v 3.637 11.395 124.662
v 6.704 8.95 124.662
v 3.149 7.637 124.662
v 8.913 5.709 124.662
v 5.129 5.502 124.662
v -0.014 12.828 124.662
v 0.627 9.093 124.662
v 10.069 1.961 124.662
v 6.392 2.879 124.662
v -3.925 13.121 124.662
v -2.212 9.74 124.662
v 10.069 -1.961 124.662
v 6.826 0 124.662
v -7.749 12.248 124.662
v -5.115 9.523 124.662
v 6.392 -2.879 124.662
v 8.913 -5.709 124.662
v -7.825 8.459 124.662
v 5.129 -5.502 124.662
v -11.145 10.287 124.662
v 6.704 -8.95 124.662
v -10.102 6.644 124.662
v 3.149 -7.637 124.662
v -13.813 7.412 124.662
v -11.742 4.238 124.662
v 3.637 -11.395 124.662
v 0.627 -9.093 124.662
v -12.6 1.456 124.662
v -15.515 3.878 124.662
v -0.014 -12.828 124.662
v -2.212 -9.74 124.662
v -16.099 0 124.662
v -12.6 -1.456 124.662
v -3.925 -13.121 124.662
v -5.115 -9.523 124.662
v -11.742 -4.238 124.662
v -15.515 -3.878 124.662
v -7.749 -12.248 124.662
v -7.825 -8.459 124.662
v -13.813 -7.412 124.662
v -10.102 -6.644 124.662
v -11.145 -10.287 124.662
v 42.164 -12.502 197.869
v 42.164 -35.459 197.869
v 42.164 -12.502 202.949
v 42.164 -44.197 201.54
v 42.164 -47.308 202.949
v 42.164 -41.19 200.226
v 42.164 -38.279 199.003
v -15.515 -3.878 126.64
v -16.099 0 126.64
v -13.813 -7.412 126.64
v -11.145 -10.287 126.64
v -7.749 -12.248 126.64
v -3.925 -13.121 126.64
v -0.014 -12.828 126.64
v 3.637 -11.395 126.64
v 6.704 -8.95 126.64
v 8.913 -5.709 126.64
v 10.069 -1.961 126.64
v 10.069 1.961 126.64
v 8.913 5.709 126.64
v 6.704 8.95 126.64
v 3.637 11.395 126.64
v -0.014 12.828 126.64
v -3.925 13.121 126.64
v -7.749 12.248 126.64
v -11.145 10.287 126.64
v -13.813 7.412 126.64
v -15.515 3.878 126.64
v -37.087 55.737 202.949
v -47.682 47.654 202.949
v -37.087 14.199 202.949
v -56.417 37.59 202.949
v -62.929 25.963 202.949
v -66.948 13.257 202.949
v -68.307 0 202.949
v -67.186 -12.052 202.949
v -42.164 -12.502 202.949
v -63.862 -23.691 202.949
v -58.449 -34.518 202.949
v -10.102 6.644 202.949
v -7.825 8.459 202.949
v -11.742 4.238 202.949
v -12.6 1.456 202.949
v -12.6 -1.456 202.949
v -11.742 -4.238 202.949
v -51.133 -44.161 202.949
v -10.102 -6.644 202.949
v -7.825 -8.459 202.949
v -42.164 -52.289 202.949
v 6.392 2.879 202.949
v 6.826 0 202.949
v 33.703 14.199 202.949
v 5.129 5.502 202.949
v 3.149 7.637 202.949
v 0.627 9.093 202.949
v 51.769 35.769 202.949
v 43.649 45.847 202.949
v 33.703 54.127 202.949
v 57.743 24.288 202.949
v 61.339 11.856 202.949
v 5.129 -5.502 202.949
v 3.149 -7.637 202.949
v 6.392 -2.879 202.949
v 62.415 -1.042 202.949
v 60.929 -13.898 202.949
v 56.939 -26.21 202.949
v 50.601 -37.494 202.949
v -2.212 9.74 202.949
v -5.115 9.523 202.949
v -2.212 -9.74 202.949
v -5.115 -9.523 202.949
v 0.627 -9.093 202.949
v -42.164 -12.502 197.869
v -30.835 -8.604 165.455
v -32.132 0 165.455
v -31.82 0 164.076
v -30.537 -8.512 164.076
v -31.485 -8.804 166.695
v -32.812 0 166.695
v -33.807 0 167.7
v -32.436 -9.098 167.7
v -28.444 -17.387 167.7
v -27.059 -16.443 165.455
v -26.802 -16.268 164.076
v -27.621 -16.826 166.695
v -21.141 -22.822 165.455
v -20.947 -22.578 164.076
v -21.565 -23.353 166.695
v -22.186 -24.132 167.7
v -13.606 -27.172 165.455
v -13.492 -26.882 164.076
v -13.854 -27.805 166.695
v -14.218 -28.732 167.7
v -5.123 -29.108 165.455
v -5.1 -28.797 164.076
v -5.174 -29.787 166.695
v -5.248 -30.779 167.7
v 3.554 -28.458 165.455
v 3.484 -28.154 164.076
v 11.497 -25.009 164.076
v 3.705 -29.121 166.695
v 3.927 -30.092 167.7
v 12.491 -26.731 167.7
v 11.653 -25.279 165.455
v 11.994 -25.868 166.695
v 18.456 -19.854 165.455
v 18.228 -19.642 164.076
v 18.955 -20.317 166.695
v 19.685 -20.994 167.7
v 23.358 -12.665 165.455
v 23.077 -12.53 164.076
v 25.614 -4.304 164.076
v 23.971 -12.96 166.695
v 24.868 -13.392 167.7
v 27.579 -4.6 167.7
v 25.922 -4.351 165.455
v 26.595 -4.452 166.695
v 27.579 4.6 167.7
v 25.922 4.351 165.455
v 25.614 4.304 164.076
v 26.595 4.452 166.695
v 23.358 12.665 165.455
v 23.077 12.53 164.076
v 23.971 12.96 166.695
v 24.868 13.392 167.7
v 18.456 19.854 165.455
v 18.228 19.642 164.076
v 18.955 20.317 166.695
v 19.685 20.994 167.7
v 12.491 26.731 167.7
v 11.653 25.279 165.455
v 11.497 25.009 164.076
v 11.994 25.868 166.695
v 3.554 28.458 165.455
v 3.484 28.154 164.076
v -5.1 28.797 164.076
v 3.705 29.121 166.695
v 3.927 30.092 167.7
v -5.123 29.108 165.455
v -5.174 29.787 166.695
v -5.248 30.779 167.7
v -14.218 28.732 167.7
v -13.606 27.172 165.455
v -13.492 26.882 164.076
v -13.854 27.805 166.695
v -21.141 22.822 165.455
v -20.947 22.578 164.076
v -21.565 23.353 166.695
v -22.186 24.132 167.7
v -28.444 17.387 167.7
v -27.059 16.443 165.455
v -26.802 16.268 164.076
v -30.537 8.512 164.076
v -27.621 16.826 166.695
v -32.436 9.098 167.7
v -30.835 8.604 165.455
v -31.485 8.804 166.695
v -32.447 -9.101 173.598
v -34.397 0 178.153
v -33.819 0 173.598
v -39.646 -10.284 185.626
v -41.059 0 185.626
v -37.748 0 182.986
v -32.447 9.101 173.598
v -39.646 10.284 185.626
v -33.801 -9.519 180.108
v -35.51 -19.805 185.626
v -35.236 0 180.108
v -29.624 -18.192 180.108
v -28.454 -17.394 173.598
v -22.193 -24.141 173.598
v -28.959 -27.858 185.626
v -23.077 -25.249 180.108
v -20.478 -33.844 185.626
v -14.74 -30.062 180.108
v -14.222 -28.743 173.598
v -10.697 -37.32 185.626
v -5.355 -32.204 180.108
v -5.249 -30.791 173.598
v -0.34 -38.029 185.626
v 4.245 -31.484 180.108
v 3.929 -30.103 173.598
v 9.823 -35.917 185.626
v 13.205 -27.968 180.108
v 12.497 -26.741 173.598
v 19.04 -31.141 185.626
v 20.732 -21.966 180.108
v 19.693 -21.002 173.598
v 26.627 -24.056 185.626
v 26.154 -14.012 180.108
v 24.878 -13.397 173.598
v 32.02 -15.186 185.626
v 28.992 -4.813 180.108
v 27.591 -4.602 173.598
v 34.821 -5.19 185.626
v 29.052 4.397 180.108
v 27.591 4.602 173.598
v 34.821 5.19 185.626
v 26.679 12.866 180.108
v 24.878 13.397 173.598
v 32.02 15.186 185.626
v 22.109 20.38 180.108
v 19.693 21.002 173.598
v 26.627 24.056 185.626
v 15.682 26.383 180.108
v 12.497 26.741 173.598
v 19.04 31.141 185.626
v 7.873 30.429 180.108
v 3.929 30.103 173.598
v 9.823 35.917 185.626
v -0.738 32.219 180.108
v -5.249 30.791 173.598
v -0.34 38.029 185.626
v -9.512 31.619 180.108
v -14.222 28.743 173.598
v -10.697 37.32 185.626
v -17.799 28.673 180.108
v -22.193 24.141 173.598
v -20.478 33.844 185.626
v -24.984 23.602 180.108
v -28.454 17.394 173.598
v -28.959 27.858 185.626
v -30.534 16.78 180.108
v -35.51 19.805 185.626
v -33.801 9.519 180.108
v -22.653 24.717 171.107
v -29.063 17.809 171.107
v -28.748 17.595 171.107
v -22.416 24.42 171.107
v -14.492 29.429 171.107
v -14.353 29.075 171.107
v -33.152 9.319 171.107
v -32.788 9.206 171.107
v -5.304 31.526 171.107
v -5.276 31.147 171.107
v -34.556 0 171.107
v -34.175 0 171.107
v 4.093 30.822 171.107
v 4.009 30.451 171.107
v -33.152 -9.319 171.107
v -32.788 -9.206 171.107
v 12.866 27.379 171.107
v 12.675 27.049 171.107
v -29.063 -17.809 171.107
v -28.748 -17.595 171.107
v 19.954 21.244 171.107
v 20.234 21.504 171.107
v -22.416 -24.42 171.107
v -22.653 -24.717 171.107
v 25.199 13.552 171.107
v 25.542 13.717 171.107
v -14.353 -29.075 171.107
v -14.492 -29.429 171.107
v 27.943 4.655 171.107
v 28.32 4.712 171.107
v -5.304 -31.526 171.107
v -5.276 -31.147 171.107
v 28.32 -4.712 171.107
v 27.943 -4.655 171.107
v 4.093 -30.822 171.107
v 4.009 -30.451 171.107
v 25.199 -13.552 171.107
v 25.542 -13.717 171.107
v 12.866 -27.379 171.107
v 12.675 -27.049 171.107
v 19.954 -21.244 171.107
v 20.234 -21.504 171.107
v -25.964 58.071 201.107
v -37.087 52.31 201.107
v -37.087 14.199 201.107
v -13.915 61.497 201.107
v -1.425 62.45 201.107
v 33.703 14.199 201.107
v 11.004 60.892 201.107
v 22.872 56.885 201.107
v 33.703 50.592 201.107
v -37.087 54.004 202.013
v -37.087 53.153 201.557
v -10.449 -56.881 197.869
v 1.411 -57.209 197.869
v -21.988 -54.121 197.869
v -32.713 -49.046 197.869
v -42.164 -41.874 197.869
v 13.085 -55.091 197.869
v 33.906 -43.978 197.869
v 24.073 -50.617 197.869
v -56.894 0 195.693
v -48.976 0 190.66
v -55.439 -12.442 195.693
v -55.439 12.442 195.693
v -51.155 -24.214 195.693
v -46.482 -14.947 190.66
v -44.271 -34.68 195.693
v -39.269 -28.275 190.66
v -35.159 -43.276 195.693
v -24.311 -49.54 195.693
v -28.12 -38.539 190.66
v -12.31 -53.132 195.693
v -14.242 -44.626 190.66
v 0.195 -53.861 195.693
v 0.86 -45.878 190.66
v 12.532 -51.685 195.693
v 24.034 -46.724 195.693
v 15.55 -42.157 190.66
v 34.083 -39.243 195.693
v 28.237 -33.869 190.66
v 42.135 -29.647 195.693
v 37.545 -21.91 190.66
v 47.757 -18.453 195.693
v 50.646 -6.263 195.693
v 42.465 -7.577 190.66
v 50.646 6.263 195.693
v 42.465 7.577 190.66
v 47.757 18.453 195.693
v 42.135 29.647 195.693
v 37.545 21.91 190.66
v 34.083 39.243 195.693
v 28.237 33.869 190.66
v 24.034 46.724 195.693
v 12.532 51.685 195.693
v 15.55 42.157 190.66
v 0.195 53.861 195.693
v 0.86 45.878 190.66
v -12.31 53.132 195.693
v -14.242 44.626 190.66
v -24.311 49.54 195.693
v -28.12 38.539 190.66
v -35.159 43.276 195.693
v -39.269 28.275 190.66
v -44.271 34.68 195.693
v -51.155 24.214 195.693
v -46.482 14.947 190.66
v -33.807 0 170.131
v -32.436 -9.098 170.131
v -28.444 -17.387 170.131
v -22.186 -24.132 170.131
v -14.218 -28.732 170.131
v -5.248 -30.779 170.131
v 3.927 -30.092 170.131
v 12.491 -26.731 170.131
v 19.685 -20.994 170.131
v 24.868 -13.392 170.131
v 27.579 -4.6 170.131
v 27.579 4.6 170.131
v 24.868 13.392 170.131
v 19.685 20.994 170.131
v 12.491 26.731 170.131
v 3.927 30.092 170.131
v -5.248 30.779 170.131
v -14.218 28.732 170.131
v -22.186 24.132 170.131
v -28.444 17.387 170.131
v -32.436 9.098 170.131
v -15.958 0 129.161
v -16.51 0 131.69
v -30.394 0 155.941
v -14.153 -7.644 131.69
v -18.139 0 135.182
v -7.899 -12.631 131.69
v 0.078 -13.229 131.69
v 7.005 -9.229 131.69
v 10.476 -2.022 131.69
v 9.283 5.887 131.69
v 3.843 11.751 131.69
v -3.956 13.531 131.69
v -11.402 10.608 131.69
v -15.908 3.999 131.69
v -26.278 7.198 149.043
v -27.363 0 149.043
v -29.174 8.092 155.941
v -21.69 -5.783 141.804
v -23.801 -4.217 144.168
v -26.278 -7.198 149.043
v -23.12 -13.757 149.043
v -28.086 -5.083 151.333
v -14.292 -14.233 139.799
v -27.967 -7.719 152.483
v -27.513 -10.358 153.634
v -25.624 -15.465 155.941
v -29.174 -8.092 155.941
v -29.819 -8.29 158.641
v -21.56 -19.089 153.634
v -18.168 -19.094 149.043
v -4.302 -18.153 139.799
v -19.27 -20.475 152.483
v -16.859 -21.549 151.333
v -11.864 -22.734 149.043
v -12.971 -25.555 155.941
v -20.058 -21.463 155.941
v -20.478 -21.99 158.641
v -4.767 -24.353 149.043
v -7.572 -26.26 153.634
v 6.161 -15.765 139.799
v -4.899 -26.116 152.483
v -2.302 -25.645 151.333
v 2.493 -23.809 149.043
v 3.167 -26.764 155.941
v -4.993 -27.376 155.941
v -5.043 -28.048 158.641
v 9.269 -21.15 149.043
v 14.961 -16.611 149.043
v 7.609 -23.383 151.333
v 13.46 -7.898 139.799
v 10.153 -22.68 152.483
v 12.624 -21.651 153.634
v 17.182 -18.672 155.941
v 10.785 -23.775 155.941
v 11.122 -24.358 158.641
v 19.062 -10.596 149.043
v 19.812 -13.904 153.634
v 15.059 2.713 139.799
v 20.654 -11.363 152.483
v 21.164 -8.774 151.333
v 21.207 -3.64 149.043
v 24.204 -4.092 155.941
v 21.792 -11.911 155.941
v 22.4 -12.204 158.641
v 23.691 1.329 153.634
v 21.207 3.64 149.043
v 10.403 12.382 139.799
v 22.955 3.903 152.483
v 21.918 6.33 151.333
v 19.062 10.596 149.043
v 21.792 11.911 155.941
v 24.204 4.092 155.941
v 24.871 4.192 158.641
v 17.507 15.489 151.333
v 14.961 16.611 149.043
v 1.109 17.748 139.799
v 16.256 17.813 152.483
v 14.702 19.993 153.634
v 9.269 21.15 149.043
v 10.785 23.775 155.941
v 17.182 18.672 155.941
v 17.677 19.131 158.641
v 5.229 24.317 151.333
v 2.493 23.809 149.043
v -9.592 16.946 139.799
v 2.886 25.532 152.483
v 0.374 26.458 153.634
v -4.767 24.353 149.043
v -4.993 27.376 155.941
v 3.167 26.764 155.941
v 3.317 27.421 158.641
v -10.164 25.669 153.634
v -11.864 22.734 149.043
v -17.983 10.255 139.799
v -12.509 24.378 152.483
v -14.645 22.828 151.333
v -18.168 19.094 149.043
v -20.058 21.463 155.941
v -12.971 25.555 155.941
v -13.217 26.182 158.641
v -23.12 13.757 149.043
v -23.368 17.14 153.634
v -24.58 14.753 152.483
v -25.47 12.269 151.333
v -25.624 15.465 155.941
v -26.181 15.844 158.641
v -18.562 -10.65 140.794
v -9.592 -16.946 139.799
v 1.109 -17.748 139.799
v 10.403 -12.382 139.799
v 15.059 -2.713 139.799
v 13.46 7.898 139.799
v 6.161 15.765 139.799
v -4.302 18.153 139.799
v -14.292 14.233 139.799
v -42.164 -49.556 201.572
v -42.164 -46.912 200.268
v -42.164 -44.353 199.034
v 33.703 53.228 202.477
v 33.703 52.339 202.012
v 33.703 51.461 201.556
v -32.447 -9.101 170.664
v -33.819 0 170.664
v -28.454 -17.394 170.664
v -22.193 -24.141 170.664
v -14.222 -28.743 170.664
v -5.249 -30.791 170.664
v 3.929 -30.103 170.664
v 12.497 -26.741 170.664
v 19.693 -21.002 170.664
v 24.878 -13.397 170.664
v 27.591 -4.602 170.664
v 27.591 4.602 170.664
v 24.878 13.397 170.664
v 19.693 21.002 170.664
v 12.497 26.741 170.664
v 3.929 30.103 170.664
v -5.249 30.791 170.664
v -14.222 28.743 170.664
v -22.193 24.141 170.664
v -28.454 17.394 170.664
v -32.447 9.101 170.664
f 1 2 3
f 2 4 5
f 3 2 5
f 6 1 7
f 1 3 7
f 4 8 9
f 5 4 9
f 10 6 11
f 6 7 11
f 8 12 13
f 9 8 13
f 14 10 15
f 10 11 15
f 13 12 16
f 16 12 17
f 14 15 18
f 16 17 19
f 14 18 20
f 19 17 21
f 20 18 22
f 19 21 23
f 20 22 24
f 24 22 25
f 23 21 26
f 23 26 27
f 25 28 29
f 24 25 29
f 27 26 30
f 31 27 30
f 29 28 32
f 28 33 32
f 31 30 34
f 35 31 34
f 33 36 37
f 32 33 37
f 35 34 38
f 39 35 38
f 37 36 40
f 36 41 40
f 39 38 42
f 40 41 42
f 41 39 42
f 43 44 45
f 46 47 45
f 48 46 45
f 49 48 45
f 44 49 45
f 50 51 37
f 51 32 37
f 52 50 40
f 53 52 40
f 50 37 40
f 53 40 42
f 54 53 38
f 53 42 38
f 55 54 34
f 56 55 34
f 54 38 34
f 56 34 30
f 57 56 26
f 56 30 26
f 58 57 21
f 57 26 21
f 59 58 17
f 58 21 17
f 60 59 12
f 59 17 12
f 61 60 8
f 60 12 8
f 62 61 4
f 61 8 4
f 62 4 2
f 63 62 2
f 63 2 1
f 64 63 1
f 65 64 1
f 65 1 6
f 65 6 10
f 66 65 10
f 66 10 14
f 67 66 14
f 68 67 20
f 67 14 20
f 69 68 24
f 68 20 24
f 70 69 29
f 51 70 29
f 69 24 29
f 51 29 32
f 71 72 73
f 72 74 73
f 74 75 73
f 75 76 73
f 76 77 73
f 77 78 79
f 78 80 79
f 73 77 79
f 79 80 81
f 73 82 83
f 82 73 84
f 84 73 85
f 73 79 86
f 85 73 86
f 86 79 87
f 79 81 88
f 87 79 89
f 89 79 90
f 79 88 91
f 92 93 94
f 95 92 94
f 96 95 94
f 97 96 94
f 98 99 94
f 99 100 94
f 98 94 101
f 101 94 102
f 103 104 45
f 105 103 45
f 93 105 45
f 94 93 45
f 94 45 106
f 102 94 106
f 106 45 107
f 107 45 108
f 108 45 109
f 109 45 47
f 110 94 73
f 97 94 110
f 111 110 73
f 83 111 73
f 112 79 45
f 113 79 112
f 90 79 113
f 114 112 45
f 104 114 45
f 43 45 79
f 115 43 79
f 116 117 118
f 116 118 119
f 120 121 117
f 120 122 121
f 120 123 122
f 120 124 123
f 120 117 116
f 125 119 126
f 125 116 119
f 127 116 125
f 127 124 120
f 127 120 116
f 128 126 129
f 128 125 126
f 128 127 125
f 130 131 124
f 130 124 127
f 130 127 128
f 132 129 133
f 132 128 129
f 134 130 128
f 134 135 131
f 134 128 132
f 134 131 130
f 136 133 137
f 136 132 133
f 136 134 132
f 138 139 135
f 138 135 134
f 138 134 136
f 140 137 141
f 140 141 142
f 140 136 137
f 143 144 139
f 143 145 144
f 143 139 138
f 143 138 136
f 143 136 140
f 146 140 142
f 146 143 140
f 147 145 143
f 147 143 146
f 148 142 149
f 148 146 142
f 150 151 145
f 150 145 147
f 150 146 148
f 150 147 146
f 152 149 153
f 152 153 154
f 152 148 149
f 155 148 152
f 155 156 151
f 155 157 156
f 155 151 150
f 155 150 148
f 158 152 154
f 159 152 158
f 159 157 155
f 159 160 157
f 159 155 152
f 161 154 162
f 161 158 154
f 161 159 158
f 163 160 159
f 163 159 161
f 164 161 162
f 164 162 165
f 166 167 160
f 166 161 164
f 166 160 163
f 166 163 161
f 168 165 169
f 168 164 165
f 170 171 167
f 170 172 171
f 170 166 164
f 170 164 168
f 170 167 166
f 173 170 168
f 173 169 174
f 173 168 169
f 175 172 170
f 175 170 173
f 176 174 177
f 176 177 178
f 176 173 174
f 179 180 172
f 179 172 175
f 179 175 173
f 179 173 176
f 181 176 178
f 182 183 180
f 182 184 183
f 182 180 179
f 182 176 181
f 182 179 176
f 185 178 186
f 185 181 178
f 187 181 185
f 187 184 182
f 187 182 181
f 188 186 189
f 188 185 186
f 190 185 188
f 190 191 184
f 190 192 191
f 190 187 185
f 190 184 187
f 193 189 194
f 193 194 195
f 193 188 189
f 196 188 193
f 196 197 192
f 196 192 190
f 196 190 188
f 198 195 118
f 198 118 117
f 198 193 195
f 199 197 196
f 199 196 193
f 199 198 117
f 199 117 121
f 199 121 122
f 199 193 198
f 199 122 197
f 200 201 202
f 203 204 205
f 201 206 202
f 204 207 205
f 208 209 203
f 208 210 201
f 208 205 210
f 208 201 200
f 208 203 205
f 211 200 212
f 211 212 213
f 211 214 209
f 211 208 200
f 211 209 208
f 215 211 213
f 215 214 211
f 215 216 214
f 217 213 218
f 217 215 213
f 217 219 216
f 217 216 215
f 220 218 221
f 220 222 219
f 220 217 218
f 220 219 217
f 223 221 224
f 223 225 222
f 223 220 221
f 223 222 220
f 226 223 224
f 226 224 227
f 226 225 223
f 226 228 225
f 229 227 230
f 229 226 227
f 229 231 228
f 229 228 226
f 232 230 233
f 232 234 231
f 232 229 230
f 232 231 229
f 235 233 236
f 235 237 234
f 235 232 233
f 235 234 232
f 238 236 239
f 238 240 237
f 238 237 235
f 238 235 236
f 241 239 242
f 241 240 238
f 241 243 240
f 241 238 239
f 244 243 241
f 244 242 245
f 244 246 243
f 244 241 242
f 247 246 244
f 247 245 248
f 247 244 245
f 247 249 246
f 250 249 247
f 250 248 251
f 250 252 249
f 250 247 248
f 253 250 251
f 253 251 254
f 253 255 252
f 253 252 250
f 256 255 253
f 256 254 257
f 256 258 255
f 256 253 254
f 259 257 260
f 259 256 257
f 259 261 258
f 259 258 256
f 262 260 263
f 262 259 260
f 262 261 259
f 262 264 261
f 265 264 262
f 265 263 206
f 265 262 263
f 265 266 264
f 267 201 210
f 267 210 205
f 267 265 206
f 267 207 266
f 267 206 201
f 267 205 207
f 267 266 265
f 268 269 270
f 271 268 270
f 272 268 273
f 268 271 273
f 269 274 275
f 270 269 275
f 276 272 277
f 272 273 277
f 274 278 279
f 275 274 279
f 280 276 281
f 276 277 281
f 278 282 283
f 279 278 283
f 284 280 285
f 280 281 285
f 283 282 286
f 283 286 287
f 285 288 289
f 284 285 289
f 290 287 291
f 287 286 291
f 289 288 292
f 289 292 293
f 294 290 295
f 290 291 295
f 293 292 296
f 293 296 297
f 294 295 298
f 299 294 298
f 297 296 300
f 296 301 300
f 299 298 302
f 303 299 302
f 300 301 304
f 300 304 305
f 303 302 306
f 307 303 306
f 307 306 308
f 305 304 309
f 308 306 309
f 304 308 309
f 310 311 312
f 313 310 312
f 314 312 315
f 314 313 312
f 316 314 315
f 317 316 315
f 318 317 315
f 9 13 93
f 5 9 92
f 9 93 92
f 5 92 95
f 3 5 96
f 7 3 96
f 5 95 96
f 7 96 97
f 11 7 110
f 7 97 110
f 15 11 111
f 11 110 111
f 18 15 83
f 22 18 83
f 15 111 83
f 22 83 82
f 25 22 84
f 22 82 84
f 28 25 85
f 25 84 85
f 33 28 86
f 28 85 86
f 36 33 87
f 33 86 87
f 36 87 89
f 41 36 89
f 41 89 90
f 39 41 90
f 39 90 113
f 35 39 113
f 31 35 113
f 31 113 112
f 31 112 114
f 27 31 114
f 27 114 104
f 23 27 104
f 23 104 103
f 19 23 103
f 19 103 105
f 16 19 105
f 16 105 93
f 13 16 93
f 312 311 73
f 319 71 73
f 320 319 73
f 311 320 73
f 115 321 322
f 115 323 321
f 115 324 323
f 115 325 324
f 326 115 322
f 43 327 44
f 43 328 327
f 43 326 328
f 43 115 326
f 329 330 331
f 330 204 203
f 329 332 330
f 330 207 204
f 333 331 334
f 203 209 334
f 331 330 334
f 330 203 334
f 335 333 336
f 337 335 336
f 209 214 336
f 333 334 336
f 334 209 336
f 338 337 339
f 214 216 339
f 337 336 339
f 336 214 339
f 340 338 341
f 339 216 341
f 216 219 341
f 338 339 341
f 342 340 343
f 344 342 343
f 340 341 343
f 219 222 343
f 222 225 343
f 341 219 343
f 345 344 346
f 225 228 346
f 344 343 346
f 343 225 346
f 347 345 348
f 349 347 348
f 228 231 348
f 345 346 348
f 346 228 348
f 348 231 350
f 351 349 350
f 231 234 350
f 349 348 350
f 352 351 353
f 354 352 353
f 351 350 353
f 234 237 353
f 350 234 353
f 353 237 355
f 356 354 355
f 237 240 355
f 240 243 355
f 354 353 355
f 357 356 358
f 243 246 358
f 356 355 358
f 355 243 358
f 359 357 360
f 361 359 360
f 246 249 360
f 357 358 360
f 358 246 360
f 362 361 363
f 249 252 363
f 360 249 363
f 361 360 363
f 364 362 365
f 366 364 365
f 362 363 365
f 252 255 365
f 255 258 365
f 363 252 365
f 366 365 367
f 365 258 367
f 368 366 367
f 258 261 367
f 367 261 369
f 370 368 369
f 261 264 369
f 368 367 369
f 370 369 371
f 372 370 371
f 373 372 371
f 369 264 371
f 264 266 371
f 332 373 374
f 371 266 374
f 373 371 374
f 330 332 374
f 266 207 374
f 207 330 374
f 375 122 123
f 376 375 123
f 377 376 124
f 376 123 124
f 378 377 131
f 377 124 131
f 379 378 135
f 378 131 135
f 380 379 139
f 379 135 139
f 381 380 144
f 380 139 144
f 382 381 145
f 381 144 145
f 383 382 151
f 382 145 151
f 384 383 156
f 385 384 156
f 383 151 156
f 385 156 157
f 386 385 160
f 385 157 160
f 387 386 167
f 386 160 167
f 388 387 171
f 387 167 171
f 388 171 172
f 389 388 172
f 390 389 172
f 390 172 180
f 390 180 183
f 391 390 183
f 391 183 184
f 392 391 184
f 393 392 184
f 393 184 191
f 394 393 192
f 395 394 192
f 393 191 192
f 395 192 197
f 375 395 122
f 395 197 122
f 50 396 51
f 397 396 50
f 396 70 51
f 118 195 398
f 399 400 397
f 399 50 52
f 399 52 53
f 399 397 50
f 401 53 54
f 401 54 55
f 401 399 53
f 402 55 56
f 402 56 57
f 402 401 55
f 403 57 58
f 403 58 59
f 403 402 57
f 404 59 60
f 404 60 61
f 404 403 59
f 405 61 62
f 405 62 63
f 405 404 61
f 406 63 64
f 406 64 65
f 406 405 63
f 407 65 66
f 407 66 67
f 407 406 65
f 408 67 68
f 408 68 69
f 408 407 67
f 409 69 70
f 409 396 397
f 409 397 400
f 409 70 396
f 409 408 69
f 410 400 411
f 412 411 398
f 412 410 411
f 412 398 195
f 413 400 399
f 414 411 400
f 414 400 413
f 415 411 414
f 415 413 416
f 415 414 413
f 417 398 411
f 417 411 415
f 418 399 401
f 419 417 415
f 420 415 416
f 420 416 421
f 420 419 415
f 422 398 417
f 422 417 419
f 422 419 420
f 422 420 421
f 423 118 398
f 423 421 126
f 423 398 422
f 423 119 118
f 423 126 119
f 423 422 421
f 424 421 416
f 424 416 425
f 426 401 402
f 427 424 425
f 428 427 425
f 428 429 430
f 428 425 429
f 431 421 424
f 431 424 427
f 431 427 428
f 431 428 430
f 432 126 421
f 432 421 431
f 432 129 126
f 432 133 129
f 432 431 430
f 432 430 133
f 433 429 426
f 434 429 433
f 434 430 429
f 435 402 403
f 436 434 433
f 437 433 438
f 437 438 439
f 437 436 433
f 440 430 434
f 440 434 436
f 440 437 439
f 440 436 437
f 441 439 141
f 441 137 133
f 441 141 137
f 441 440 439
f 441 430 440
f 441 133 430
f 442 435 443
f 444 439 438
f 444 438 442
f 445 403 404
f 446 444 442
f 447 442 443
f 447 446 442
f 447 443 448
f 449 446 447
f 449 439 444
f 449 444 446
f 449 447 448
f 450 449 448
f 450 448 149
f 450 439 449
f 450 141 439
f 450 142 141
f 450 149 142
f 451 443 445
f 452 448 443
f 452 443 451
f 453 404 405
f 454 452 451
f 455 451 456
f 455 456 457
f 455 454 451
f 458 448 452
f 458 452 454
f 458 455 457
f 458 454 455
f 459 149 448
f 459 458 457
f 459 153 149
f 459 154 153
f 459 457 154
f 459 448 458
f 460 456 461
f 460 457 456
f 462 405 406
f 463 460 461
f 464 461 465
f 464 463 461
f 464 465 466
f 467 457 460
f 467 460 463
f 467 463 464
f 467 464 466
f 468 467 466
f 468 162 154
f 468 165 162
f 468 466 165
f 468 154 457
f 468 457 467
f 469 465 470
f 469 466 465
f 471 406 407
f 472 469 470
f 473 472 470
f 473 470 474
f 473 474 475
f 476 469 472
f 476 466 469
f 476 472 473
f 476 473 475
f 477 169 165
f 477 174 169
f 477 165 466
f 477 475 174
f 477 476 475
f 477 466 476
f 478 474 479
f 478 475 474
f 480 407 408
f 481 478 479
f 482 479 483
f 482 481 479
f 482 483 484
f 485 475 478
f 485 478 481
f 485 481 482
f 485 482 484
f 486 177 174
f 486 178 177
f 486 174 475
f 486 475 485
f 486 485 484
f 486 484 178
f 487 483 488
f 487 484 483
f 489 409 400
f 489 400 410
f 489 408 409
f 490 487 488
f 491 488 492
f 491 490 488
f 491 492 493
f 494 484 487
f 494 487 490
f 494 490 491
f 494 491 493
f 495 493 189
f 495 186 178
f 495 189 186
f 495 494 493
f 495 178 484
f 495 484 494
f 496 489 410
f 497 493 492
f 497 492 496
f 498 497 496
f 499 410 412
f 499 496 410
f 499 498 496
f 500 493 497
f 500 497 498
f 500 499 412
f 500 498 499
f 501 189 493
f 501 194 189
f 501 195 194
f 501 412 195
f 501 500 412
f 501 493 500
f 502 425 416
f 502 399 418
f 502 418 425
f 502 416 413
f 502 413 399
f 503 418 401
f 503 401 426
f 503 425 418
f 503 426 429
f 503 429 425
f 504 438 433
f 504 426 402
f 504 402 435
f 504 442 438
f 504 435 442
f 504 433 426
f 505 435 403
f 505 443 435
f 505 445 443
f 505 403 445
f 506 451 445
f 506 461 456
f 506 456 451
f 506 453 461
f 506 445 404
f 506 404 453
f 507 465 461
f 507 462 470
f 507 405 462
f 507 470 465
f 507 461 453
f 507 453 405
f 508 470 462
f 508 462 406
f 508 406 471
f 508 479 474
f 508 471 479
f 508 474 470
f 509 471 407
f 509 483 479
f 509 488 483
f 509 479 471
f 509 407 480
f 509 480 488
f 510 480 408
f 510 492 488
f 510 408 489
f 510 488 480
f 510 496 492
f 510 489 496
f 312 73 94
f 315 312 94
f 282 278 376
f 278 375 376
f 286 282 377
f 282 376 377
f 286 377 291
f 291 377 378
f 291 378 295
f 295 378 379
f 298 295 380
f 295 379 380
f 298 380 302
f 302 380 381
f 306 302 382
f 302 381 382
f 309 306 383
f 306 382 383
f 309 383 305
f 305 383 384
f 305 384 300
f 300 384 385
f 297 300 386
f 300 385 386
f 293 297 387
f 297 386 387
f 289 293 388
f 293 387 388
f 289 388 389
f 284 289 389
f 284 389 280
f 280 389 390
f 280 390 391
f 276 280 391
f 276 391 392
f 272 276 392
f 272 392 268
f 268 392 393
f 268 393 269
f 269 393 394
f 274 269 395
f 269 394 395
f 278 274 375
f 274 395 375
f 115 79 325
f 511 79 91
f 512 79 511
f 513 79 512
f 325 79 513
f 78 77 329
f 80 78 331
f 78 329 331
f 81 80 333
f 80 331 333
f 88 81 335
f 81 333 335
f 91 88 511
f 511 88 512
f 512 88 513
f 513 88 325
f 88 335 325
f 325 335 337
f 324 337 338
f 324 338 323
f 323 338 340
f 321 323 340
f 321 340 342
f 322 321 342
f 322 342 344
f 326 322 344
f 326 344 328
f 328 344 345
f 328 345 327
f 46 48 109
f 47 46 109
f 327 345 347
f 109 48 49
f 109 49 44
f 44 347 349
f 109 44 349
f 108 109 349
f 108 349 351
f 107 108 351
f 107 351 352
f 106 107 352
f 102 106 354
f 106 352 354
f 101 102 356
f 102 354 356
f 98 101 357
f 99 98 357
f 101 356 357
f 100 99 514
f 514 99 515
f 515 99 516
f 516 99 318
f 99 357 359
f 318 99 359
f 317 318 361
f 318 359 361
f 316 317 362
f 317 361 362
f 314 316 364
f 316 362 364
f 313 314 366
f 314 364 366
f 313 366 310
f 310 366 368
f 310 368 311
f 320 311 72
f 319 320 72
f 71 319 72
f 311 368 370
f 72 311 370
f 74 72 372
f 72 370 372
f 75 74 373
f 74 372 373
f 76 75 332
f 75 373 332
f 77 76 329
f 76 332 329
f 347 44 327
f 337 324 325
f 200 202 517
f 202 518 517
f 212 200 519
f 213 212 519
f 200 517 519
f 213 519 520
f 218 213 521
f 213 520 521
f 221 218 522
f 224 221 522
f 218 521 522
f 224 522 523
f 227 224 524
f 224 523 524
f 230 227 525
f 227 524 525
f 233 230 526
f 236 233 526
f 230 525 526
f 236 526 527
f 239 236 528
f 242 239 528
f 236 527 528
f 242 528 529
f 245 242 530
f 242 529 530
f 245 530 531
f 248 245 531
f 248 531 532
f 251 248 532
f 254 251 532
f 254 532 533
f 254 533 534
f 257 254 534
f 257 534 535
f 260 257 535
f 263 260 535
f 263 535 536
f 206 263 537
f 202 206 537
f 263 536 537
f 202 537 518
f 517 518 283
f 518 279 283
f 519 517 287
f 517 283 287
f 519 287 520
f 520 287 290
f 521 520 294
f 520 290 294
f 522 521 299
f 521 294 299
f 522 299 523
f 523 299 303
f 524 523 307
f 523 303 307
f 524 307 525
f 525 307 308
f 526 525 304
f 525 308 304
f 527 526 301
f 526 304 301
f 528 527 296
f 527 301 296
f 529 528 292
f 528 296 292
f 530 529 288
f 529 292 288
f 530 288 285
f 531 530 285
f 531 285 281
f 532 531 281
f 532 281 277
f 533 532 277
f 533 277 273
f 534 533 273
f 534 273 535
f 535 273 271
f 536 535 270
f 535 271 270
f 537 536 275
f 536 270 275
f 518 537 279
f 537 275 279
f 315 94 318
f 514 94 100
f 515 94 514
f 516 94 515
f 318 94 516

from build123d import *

# Parameters (mm, degrees)
F3_R     = 9.7677281956
F3_R_2   = 7.6796646
F4_DEPTH = 86.2554833293
F5_DEPTH = 1.8415
F6_DEPTH = 5.08


# Not quite as in the source:
# - a fillet or chamfer that OpenCascade refuses, or shapes differently, is made with other operations: its cross-section is extruded or revolved along the edge and cut away or added


with BuildPart() as f1:
    # F0 (on Front) → F1 (revolve)
    with BuildSketch(Plane.XZ):
        with BuildLine():
            add(Edge.make_bspline(
                [(-16.0994362086, 126.6403571513), (-15.4416487906, 129.818912005), (-18.3602187314, 137.0481581434), (-30.7776463133, 151.6944538615), (-31.8157197837, 162.4649808678), (-32.0365097363, 167.6998246302)],
                knots=[0, 0, 0, 0, 0.2764092674, 0.6542388522, 1, 1, 1, 1], degree=3))
            Line((-16.0994362086, 126.6403571513), (-16.0994362086, 124.6616938849))
            Line((-16.0994362086, 124.6616938849), (-10.6212262798, 124.6616938849))
            Line((-10.6212262798, 124.6616938849), (-10.6212262798, 126.6403571513))
            Line((-10.6212262798, 126.6403571513), (-10.6212262798, 167.9538246302))
            Line((-10.6212262798, 167.9538246302), (-10.6212262798, 173.5984517965))
            Line((-10.6212262798, 173.5984517965), (-10.6212262798, 192.7077323198))
            Line((-10.6212262798, 192.7077323198), (-10.6212262798, 202.9486296068))
            Line((-10.6212262798, 202.9486296068), (-68.306534248, 202.9486296068))
            Line((-68.306534248, 202.9486296068), (-56.8935275078, 195.6928223372))
            Line((-56.8935275078, 195.6928223372), (-41.0592220724, 185.6261789799))
            add(Edge.make_bspline(
                [(-33.8192135096, 173.5984517965), (-33.9311976843, 175.7700643461), (-34.1712077818, 180.4243736831), (-38.663140823, 183.8166663782), (-41.0592220724, 185.6261789799)],
                knots=[0, 0, 0, 0, 0.4665812951, 1, 1, 1, 1], degree=3))
            Line((-33.8192135096, 173.5984517965), (-33.8192135096, 170.823040801))
            Line((-33.8192135096, 170.823040801), (-33.8192135096, 170.6639382431))
            Line((-33.8192135096, 170.6639382431), (-34.1753996909, 171.1073964834))
            Line((-34.1753996909, 171.1073964834), (-34.47479508, 171.1073964834))
            Line((-34.47479508, 171.1073964834), (-34.5564074814, 171.1073964834))
            Line((-34.5564074814, 171.1073964834), (-33.8073261082, 170.1312959194))
            Line((-33.8073261082, 170.1312959194), (-33.8073261082, 167.6998246302))
            Line((-33.8073261082, 167.6998246302), (-32.0365097363, 167.6998246302))
        make_face()
    revolve(axis=Axis((-2.9415616798, 0, 150.6240181996), (0, 0, 1)))

    # F2: fillet of radius 5.08 on 1 edges, made by hand

    # F2_s1 → F2_t2 (revolve)
    with BuildSketch(Plane.XZ):
        with BuildLine():
            ThreePointArc((-31.8196671786, 164.0759580259), (-32.4282830228, 166.0991776077), (-33.8073261082, 167.6998246302))
            Line((-33.8073261082, 167.6998246302), (-33.7458267391, 167.780697293))
            ThreePointArc((-33.7458267391, 167.780697293), (-32.9219179223, 167.8014246302), (-32.0365097363, 167.8014246302))
            Line((-32.0365097363, 167.8014246302), (-31.934999984, 167.704106006))
            ThreePointArc((-31.934999984, 167.704106006), (-31.8450405903, 165.8927492145), (-31.7184146309, 164.0843533567))
            Line((-31.7184146309, 164.0843533567), (-31.8196671786, 164.0759580259))
        make_face()
    revolve(axis=Axis((-2.9415616798, 0, 167.6998246302), (0, 0, 1)))

    # F3 (on face) → F4 (cut)
    with BuildSketch(Plane.XY.offset(202.9486296068)):
        with Locations((-2.9415616798, 0)):
            Circle(F3_R)
        with Locations((-2.9415616798, 0)):
            Circle(F3_R_2, mode=Mode.SUBTRACT)
    extrude(amount=-F4_DEPTH, mode=Mode.SUBTRACT)

    # F3 (on face) → F5 (cut)
    with BuildSketch(Plane.XY.offset(202.9486296068)):
        with BuildLine():
            Line((-37.0871919824, 14.1988984612), (33.7026080176, 14.1988984612))
            Line((33.7026080176, 14.1988984612), (33.7026080176, 54.127483463))
            ThreePointArc((33.7026080176, 54.127483463), (-1.4554201029, 65.3480758864), (-37.0871919824, 55.7373803661))
            Line((-37.0871919824, 55.7373803661), (-37.0871919824, 14.1988984612))
        make_face()
    extrude(amount=-F5_DEPTH, mode=Mode.SUBTRACT)

    # F3 (on face) → F6 (cut)
    with BuildSketch(Plane.XY.offset(202.9486296068)):
        with BuildLine():
            Line((-42.164, -12.5023329654), (-42.164, -52.2893867918))
            ThreePointArc((-42.164, -52.2893867918), (0.9127584674, -65.2512364254), (42.164, -47.3082227989))
            Line((42.164, -47.3082227989), (42.164, -12.5023329654))
            Line((42.164, -12.5023329654), (-42.164, -12.5023329654))
        make_face()
    extrude(amount=-F6_DEPTH, mode=Mode.SUBTRACT)


solid = f1.part
